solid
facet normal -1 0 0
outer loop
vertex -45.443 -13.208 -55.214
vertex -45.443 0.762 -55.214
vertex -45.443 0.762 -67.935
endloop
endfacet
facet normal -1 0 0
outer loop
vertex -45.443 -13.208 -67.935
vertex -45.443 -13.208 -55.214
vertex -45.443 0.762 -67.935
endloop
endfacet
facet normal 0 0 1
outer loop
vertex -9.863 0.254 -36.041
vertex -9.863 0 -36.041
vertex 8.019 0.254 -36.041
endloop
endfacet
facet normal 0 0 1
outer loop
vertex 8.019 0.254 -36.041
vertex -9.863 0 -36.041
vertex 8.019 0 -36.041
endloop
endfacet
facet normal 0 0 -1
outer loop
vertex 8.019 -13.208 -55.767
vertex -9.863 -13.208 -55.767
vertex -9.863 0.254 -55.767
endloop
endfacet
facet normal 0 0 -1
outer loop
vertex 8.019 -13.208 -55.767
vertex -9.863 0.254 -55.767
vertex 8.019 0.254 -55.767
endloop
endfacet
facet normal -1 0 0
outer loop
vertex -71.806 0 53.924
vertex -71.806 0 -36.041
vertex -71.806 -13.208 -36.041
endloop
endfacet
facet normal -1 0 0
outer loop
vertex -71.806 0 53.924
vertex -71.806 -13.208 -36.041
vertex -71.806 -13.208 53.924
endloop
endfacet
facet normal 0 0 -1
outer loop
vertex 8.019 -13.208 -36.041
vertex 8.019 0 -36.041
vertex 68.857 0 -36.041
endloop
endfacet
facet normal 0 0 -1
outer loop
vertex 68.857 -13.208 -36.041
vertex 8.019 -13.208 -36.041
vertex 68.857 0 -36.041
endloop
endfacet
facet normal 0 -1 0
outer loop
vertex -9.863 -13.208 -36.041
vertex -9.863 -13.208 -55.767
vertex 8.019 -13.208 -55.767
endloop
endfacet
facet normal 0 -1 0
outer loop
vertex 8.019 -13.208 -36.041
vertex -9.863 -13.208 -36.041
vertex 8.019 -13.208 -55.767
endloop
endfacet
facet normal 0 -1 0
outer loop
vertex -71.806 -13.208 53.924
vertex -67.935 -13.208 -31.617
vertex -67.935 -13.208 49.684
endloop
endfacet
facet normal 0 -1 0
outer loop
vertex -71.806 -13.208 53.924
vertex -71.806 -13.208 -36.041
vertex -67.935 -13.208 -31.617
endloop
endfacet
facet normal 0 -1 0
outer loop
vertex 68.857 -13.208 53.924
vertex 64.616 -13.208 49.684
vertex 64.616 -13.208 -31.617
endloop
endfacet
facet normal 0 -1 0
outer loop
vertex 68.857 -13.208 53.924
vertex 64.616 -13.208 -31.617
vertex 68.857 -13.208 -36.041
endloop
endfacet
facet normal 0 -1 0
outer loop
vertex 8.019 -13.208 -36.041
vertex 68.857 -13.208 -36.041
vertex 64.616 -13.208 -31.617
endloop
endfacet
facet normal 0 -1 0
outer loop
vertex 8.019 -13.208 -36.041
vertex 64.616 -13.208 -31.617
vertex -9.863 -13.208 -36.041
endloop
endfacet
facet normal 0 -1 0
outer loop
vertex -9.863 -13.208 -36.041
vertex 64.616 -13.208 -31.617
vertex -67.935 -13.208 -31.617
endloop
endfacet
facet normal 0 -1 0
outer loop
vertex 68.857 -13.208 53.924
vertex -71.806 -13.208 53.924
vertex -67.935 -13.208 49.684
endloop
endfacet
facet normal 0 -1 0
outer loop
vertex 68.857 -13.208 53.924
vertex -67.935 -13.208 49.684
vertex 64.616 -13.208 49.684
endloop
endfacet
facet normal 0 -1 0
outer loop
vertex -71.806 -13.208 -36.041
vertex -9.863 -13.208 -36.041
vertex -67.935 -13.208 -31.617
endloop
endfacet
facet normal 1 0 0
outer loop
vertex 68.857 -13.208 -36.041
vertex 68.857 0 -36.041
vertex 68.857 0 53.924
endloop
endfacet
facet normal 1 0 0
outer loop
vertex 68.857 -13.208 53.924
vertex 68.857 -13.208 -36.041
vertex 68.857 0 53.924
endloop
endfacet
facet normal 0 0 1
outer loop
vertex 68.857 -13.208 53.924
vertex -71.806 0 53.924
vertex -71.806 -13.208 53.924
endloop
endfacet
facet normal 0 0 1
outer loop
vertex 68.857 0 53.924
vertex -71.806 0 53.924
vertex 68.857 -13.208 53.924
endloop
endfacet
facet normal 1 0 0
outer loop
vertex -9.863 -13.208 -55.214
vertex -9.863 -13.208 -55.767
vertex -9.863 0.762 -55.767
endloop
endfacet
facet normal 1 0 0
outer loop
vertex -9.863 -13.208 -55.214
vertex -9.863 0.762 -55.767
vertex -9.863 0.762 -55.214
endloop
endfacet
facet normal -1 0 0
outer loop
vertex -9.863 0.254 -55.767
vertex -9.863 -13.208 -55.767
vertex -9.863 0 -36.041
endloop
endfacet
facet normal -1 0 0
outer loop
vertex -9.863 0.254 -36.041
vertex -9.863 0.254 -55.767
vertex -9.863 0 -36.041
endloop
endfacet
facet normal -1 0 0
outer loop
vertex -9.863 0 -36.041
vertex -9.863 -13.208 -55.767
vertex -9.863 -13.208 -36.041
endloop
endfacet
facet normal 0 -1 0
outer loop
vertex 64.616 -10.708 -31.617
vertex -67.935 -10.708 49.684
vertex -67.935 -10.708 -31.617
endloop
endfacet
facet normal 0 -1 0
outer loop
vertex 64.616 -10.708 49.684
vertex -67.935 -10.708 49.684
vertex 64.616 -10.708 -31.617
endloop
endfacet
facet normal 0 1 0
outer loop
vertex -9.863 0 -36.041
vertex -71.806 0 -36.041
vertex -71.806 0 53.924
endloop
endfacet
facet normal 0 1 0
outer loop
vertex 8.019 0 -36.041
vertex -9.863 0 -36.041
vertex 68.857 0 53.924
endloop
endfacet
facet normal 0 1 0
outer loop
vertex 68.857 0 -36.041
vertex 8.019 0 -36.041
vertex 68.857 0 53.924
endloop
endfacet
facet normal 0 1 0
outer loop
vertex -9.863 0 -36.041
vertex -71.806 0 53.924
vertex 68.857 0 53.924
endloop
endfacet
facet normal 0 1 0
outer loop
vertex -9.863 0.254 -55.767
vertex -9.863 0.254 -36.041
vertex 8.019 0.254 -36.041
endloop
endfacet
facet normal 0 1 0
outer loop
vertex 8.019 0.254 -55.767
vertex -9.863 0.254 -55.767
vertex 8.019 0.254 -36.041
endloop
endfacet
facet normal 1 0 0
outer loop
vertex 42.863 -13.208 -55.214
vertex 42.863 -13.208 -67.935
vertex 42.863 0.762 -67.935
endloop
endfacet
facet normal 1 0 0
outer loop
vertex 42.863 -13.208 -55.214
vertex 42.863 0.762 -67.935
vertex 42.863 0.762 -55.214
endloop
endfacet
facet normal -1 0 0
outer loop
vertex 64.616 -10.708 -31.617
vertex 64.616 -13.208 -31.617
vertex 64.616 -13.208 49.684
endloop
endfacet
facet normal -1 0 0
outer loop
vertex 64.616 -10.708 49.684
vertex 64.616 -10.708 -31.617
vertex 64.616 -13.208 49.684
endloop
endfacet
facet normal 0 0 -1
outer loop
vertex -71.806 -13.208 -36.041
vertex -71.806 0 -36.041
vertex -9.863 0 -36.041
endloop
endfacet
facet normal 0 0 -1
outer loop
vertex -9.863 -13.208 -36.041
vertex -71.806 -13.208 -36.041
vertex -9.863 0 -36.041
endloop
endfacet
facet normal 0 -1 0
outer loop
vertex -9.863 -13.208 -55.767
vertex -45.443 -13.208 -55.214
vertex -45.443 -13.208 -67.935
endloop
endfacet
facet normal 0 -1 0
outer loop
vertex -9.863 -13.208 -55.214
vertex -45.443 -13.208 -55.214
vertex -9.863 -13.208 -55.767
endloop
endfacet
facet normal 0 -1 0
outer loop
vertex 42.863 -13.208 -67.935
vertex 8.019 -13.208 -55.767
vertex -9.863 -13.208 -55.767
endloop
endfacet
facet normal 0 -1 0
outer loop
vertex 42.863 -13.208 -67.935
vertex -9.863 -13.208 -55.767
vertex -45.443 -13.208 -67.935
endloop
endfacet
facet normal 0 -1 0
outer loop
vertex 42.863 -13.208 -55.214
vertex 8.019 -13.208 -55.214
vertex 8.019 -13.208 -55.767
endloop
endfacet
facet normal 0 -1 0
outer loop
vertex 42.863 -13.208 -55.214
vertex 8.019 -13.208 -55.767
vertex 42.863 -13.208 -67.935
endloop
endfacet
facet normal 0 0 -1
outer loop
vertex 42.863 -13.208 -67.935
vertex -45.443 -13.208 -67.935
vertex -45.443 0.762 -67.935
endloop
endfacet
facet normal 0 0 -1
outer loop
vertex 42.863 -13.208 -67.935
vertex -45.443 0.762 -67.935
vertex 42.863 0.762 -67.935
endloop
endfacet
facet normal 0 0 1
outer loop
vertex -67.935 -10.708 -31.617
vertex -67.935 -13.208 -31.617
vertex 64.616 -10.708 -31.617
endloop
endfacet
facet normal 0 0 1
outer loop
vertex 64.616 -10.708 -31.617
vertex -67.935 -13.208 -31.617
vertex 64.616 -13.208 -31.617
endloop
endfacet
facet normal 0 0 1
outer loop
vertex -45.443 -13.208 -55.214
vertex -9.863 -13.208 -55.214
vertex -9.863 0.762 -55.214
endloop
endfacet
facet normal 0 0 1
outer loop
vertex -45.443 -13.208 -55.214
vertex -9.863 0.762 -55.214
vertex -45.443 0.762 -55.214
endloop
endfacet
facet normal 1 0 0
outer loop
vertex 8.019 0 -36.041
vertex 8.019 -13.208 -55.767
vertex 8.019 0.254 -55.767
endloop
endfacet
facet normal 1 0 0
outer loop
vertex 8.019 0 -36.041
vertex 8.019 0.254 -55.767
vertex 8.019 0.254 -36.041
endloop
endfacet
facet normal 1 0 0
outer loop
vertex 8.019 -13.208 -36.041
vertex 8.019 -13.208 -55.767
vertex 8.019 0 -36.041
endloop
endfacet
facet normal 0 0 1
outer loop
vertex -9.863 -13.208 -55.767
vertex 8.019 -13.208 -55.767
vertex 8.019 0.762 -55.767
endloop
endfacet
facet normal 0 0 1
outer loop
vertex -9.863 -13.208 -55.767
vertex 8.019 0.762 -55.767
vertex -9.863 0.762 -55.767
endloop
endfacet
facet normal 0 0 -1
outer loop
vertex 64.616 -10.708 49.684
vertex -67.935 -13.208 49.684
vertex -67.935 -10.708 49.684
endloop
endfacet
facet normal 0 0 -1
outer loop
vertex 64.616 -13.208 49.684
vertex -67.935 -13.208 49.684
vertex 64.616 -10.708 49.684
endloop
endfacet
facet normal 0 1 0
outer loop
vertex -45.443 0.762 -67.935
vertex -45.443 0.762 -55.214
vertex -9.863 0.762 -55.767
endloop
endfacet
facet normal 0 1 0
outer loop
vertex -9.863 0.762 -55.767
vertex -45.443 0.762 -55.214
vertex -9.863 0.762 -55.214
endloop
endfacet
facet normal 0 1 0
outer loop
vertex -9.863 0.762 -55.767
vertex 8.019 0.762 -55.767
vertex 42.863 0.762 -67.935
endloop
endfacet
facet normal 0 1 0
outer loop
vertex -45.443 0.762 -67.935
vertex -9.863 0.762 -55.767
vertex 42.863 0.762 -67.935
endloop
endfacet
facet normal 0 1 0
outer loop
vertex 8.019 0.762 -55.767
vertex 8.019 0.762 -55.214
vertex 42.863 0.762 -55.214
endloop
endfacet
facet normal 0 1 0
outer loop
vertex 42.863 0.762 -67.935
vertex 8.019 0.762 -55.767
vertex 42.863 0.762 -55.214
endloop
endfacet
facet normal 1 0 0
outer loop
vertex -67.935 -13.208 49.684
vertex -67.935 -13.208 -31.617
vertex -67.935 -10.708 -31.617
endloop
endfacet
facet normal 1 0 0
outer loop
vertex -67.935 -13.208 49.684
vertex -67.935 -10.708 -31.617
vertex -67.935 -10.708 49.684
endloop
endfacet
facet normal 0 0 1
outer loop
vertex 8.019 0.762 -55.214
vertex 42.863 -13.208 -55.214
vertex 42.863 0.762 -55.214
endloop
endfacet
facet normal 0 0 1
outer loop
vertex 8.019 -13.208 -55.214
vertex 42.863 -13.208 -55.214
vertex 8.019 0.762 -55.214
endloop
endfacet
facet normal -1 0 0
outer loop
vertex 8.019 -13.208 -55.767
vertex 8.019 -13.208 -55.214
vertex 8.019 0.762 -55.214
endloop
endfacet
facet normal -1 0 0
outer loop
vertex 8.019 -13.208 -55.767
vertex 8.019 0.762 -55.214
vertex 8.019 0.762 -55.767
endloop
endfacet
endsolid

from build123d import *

# Parameters (mm, degrees)
F0_W      = 140.6627446413
F0_H      = 89.9651609361
F1_DEPTH  = 13.208
F2_W      = 132.5511261821
F2_H      = 81.3004858792
F3_DEPTH  = 5
F4_W      = 132.5511261821
F4_H      = 81.3004858792
F5_DEPTH  = 2.5
F6_W      = 17.8824178874
F6_H      = 19.7259671986
F7_DEPTH  = 13.462
F10_DEPTH = 13.97


with BuildPart() as f1:
    # F0 (on Front) → F1 (new body)
    with BuildSketch(Plane.XZ):
        with Locations((-1.4748349786, 8.9412089437)):
            Rectangle(F0_W, F0_H)
    extrude(amount=F1_DEPTH)

    # F2 (on face) → F3 (cut, symmetric)
    with BuildSketch(Plane.XZ.offset(13.208)):
        with Locations((-1.6591958702, 9.0333875269)):
            Rectangle(F2_W, F2_H)
    extrude(amount=F3_DEPTH, both=True, mode=Mode.SUBTRACT)

    # F4 (on face) → F5 (join)
    with BuildSketch(Plane.XZ.offset(8.208)):
        with Locations((-1.6591958702, 9.0333875269)):
            Rectangle(F4_W, F4_H)
    extrude(amount=F5_DEPTH)

    # F6 (on face) → F7 (join)
    with BuildSketch(Plane.XZ.offset(13.208)):
        with Locations((-0.9217746556, -45.9043551236)):
            Rectangle(F6_W, F6_H)
    extrude(amount=-F7_DEPTH)


with BuildPart() as f10:
    # F9 (on face) → F10 (new body)
    with BuildSketch(Plane.XZ.offset(13.208)):
        Polygon((-9.8629835993, -55.7673387229), (-9.8629835993, -55.2142746747), (-45.4434677958, -55.2142746747), (-45.4434677958, -67.9347589612), (42.8625009954, -67.9347589612), (42.8625009954, -55.2142746747), (8.0194342881, -55.2142746747), (8.0194342881, -55.7673387229), align=None)
    extrude(amount=-F10_DEPTH)


solid = Compound([f1.part, f10.part])
